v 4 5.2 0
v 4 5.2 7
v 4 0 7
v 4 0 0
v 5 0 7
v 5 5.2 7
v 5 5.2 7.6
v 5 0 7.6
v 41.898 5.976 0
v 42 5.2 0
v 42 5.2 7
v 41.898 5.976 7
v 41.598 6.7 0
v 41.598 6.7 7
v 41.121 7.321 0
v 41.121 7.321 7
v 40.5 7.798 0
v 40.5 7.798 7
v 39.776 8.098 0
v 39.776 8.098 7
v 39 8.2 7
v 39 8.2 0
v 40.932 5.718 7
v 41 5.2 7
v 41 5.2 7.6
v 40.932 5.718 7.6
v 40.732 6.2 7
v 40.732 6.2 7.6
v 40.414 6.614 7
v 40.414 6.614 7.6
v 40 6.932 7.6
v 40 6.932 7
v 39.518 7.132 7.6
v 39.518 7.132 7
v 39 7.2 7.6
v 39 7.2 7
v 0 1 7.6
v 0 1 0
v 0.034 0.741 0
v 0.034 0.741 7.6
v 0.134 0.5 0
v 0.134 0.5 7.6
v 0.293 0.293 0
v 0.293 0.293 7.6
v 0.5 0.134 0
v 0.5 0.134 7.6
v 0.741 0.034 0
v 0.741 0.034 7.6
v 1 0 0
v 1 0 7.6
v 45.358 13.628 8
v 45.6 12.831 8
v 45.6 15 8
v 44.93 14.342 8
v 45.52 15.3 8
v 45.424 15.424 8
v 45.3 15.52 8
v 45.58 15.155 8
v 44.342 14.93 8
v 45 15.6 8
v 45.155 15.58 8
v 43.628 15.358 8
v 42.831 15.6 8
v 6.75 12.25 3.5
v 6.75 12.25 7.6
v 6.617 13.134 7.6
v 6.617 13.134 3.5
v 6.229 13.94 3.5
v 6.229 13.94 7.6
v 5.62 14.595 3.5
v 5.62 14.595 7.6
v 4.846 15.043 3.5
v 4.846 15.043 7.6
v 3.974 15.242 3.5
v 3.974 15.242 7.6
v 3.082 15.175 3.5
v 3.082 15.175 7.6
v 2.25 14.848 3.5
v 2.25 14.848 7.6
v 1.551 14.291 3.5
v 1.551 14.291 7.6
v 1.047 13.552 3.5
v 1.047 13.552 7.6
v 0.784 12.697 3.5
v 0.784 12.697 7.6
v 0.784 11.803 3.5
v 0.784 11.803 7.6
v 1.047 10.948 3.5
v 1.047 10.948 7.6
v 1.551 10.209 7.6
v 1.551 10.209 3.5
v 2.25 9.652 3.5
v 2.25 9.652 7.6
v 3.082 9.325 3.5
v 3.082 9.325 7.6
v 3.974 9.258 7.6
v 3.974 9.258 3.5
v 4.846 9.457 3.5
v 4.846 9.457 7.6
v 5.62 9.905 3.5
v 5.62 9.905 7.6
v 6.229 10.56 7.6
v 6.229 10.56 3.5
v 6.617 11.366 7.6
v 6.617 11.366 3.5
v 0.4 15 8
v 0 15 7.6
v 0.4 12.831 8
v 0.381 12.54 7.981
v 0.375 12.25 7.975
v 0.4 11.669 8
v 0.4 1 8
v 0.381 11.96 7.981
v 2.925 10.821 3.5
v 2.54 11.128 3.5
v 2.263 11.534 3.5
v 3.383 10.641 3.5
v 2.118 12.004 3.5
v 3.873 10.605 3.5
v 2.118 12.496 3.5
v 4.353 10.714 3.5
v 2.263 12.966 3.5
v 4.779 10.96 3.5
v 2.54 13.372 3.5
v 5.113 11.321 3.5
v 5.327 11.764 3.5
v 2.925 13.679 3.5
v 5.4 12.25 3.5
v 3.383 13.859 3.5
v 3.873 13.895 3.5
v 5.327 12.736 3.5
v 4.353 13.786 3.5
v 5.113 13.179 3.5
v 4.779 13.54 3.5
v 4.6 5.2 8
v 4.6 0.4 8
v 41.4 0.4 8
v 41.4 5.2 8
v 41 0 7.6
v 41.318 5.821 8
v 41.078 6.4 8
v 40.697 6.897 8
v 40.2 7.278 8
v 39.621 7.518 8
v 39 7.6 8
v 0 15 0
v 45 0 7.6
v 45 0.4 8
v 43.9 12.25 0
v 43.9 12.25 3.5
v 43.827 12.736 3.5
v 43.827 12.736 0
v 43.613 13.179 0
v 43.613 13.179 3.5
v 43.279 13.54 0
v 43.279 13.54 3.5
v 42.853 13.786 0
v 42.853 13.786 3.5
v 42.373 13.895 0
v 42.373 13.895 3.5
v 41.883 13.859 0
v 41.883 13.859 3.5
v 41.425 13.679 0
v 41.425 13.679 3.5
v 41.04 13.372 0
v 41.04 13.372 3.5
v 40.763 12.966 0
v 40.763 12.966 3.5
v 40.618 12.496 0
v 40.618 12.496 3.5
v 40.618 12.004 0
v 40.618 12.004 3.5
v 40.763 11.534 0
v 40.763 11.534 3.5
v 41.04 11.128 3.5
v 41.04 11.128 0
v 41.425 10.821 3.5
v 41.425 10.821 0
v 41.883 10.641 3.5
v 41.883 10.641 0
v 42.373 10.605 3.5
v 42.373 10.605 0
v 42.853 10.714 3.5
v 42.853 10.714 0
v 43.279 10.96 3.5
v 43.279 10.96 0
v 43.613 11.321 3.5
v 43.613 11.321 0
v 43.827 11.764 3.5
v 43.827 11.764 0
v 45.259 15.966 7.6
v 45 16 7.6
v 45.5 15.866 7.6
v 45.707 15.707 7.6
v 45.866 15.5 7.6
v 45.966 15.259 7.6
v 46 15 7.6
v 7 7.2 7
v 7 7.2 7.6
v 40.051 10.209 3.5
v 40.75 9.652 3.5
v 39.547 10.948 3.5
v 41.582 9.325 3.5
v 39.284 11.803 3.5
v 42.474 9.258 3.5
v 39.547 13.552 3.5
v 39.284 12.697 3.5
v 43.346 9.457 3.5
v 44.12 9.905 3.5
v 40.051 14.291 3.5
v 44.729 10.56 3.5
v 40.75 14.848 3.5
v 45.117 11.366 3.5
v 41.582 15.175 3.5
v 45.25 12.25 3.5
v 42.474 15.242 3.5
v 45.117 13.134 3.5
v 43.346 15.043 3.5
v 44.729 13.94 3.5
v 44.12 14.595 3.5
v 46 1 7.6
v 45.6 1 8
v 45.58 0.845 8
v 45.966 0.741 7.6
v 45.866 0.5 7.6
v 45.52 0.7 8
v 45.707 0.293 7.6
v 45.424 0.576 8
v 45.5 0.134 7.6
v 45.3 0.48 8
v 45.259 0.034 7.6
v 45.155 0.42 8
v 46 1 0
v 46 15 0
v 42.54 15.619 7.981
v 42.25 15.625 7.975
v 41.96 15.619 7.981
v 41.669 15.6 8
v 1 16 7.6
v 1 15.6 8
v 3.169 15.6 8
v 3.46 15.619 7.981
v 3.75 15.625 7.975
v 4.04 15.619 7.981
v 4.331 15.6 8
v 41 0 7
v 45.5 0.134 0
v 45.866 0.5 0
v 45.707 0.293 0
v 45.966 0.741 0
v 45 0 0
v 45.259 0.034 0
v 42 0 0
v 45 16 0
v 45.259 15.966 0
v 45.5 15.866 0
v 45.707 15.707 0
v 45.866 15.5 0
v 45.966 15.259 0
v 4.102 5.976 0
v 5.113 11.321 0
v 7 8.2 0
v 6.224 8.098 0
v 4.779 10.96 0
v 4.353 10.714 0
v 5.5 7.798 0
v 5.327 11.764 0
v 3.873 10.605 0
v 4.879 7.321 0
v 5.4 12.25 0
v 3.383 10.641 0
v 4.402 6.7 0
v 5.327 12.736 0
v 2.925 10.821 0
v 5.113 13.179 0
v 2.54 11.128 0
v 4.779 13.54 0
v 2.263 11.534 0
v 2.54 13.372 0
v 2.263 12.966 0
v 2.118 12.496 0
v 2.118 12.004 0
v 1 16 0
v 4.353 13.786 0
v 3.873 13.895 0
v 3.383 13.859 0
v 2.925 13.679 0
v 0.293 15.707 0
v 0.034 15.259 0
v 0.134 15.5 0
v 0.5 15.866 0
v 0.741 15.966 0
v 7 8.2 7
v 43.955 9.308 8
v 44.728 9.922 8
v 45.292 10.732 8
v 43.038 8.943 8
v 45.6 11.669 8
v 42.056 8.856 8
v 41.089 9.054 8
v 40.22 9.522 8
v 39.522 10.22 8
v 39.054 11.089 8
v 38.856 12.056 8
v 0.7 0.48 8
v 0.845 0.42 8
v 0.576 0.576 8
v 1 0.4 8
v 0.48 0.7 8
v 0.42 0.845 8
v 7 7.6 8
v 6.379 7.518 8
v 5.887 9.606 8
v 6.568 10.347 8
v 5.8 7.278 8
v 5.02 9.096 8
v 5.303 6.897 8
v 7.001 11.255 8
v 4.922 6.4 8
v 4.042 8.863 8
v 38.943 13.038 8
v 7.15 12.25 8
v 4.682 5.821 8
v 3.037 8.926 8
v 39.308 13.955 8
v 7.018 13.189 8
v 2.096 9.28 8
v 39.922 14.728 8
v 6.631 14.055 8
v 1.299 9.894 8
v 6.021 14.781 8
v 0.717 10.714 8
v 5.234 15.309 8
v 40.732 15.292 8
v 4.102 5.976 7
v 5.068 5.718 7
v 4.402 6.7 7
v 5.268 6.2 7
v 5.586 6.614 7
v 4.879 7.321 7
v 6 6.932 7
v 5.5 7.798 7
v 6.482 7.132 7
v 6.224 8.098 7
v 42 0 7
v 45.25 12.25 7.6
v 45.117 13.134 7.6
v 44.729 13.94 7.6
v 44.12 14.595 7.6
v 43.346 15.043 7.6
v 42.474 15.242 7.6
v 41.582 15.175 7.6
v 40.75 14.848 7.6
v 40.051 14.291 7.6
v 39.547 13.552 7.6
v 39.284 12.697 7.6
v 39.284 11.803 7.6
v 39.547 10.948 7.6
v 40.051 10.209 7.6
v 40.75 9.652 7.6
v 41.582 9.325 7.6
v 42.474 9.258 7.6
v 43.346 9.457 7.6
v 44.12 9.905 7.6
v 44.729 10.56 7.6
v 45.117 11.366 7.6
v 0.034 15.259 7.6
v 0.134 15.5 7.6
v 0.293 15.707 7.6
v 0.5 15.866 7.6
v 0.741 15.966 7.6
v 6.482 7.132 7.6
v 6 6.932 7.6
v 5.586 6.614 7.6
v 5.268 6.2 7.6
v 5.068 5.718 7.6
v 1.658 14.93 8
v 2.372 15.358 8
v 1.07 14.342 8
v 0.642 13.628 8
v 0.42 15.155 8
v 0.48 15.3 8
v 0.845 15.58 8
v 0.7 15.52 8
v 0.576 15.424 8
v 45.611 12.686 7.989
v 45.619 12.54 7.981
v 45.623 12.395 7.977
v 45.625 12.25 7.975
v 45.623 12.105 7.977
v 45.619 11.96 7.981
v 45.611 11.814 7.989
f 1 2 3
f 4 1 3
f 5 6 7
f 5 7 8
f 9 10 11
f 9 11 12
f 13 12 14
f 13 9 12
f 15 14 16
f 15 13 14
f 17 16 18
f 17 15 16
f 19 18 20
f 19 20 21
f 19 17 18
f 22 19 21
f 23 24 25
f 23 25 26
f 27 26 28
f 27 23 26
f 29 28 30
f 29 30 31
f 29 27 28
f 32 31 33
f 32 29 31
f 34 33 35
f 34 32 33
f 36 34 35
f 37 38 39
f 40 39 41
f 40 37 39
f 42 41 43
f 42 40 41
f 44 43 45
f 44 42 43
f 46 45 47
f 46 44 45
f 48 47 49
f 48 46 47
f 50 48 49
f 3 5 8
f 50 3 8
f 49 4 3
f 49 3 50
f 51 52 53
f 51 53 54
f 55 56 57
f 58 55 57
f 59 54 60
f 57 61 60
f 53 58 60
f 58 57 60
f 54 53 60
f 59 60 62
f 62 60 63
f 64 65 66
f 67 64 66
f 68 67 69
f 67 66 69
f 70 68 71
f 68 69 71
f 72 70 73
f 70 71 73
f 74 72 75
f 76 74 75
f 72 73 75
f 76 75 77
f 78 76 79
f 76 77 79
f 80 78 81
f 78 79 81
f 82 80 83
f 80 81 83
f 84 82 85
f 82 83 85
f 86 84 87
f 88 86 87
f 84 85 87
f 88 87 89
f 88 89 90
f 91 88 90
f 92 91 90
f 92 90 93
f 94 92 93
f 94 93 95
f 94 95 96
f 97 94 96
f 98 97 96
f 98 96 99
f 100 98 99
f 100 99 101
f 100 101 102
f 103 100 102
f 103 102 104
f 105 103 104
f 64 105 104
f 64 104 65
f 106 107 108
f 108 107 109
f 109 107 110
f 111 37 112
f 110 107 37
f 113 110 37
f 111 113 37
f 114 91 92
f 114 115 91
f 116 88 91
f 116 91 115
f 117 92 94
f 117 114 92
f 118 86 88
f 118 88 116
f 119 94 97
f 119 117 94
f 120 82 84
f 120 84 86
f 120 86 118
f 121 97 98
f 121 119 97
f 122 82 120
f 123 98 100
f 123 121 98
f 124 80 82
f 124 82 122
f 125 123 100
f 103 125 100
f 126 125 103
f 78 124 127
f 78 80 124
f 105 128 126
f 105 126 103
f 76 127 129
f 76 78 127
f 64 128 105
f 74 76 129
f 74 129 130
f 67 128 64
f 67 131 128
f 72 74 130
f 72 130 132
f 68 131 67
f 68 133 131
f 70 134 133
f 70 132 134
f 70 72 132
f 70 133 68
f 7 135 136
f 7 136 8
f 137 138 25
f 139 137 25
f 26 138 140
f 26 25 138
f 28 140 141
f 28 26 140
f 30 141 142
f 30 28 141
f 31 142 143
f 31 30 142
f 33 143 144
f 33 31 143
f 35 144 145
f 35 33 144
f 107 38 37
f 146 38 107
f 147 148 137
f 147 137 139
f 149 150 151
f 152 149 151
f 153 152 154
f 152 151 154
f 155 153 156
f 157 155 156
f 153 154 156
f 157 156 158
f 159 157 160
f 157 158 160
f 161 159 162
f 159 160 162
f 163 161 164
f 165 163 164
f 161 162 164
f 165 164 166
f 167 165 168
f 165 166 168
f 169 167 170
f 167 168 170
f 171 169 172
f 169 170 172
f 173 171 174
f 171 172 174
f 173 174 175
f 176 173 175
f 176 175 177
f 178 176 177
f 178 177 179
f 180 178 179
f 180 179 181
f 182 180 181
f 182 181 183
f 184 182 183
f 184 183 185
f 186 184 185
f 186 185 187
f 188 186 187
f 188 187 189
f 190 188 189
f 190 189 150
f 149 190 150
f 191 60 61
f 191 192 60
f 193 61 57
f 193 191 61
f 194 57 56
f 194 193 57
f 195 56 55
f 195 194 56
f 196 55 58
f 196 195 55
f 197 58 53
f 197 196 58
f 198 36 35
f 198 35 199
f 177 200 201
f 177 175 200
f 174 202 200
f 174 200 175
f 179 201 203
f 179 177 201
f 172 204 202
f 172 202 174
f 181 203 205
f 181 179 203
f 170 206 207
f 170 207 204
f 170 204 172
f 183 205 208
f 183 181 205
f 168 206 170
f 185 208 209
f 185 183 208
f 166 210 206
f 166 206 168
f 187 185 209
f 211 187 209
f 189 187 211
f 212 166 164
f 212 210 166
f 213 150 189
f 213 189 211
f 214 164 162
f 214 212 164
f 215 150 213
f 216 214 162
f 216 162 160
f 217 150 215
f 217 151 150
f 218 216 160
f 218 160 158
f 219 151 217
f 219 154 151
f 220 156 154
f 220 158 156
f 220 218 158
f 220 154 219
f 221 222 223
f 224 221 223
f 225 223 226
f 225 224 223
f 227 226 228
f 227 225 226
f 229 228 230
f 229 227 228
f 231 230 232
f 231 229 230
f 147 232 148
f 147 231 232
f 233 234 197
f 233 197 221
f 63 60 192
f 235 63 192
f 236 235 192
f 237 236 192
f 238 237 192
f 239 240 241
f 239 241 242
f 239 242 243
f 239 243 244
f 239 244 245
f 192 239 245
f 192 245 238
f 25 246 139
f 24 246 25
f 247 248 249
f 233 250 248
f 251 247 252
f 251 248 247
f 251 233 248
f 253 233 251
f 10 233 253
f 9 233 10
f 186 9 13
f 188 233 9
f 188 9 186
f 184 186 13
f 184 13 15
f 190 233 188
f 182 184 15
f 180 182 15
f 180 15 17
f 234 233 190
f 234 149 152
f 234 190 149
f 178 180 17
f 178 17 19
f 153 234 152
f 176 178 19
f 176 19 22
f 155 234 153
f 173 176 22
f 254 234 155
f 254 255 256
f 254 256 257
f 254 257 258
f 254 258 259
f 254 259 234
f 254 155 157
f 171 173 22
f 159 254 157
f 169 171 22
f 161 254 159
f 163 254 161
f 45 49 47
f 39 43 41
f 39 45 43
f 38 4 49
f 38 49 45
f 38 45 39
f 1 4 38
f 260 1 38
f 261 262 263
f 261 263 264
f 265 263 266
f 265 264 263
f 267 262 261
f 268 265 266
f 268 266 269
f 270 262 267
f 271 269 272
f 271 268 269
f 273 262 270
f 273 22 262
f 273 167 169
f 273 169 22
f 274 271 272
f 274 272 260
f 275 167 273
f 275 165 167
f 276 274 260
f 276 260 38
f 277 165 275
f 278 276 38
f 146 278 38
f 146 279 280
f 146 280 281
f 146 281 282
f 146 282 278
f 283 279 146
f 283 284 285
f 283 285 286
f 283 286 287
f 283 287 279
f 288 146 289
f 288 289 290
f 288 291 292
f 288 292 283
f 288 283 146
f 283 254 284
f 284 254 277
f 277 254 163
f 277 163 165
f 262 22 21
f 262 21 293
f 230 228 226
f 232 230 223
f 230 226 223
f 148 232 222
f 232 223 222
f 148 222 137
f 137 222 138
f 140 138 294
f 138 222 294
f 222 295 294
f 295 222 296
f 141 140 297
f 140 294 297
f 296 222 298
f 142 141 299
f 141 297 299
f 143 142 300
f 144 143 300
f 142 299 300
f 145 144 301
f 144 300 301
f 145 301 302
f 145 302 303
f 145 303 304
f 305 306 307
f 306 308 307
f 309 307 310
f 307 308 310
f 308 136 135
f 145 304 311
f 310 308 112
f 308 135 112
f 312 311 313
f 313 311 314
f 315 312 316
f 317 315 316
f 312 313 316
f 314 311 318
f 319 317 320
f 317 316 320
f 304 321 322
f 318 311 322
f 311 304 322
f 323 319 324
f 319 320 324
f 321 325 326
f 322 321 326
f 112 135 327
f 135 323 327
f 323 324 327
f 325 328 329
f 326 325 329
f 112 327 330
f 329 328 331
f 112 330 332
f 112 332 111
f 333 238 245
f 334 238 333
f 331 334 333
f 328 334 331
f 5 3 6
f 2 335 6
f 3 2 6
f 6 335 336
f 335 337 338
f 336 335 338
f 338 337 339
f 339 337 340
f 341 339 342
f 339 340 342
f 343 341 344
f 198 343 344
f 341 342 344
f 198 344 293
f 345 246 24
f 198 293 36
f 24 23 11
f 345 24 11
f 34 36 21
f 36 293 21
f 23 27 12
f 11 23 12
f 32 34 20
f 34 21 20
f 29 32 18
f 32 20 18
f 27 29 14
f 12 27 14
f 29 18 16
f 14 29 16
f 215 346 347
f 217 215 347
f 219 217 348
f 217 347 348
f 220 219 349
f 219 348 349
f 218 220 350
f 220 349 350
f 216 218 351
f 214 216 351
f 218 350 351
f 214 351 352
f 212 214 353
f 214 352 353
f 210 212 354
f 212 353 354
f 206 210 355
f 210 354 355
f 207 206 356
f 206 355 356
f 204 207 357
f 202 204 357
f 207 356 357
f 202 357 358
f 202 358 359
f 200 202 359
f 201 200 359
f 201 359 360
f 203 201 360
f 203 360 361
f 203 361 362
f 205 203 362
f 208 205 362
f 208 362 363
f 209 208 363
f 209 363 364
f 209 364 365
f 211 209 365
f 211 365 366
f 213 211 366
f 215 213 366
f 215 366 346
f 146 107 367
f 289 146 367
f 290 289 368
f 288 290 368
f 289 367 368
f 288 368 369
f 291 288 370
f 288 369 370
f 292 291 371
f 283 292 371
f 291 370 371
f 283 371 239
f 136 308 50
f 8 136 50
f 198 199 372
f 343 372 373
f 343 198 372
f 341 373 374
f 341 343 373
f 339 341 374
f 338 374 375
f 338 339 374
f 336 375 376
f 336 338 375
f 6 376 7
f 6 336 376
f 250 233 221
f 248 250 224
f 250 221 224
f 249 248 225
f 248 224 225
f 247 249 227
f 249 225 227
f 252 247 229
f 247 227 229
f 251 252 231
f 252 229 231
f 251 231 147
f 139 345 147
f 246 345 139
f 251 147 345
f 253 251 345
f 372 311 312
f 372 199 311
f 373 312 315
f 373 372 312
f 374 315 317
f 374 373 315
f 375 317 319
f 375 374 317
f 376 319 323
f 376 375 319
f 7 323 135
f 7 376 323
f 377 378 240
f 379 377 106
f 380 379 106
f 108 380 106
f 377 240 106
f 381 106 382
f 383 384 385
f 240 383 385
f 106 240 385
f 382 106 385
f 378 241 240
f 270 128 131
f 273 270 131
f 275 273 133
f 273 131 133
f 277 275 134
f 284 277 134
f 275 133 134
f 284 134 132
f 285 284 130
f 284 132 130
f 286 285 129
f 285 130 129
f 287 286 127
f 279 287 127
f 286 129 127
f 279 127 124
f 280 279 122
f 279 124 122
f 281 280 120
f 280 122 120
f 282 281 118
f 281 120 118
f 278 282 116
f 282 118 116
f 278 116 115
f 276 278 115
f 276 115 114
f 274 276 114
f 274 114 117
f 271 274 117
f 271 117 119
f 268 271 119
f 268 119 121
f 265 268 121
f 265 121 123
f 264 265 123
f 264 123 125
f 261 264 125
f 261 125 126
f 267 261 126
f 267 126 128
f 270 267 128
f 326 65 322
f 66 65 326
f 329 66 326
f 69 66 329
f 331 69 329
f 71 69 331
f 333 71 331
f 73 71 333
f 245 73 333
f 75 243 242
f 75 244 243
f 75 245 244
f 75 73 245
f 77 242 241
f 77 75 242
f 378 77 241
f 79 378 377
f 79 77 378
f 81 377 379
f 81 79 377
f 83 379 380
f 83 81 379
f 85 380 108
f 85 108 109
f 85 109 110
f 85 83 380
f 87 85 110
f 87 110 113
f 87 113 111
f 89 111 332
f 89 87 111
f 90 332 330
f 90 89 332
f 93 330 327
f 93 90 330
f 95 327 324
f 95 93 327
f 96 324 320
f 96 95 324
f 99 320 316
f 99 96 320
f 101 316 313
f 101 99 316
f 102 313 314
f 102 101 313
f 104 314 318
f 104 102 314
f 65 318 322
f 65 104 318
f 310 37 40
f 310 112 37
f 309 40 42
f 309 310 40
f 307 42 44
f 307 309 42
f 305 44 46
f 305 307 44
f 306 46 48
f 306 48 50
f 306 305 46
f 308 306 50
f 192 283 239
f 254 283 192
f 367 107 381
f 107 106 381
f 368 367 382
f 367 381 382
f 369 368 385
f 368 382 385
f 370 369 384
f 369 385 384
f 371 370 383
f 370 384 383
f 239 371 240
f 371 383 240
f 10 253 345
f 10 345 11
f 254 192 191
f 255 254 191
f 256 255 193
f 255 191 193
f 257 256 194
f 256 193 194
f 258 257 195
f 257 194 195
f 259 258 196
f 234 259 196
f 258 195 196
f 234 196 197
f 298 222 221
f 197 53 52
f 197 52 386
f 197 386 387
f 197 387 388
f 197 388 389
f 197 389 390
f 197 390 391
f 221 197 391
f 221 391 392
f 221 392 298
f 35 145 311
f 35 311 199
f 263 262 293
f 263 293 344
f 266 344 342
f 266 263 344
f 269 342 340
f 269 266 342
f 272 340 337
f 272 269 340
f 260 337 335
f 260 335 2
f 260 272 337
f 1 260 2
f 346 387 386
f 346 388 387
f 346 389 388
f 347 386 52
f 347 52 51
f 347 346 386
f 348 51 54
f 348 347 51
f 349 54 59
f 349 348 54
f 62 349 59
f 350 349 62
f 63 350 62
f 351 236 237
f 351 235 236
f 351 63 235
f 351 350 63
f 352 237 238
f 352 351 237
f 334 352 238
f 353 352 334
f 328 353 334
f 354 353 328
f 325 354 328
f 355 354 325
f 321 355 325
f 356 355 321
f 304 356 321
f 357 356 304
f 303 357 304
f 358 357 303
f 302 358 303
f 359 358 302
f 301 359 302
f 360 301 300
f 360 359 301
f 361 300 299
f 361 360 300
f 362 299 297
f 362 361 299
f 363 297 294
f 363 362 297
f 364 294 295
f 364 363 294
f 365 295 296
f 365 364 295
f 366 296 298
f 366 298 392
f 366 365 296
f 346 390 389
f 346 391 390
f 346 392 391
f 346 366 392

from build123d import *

# Parameters (mm, degrees)
BOSS_EXTRUDE1_DEPTH = 8
CUT_EXTRUDE1_REACH  = 51.356
SKETCH2_R           = 1.65
SKETCH3_R           = 3
CUT_EXTRUDE2_DEPTH  = 4.5
CUT_EXTRUDE3_DEPTH  = 7
FILLET1_R           = 1
CHAMFER2_SIZE       = 0.4


with BuildPart() as part:
    # Sketch1 → Boss-Extrude1 (new body)
    with BuildSketch(Plane.XY):
        with BuildLine():
            Line((0, 0), (0, 16))
            Line((0, 16), (46, 16))
            Line((46, 16), (46, 0))
            Line((46, 0), (41, 0))
            Line((41, 0), (41, 5.2))
            ThreePointArc((41, 5.2), (40.414213562, 6.614213562), (39, 7.2))
            Line((39, 7.2), (7, 7.2))
            ThreePointArc((7, 7.2), (5.585786438, 6.614213562), (5, 5.2))
            Line((5, 5.2), (5, 0))
            Line((5, 0), (0, 0))
        make_face()
    extrude(amount=BOSS_EXTRUDE1_DEPTH)

    # Sketch2 → Cut-Extrude1 (cut, up to next)
    with BuildSketch(Plane.XY.offset(8), mode=Mode.PRIVATE) as cut_extrude1_sk1:
        with Locations((3.75, 12.25)):
            Circle(SKETCH2_R)
    cut_extrude1_tool1 = extrude(cut_extrude1_sk1.sketch, amount=-CUT_EXTRUDE1_REACH, mode=Mode.PRIVATE) & part.part
    # Sketch2 → Cut-Extrude1 (cut, up to next)
    with BuildSketch(Plane.XY.offset(8), mode=Mode.PRIVATE) as cut_extrude1_sk2:
        with Locations((42.25, 12.25)):
            Circle(SKETCH2_R)
    cut_extrude1_tool2 = extrude(cut_extrude1_sk2.sketch, amount=-CUT_EXTRUDE1_REACH, mode=Mode.PRIVATE) & part.part
    add(cut_extrude1_tool1.solids().sort_by_distance((3.75, 12.25, 8))[0], mode=Mode.SUBTRACT)
    add(cut_extrude1_tool2.solids().sort_by_distance((42.25, 12.25, 8))[0], mode=Mode.SUBTRACT)

    # Sketch3 → Cut-Extrude2 (cut)
    with BuildSketch(Plane.XY.offset(8)):
        with Locations((3.75, 12.25)):
            Circle(SKETCH3_R)
        with Locations((42.25, 12.25)):
            Circle(SKETCH3_R)
    extrude(amount=-CUT_EXTRUDE2_DEPTH, mode=Mode.SUBTRACT)

    # Sketch4 → Cut-Extrude3 (cut)
    with BuildSketch(Plane(origin=(0, 0, 0), x_dir=(-1, 0, 0), z_dir=(0, 0, -1))):
        with BuildLine():
            Line((-4, 0), (-5, 0))
            Line((-5, 0), (-5, 5.2))
            ThreePointArc((-5, 5.2), (-5.585786438, 6.614213562), (-7, 7.2))
            Line((-7, 7.2), (-39, 7.2))
            ThreePointArc((-39, 7.2), (-40.414213592, 6.614213592), (-41, 5.2))
            Line((-41, 5.2), (-41, 0))
            Line((-41, 0), (-42, 0))
            Line((-42, 0), (-42, 5.200000101))
            ThreePointArc((-42, 5.200000101), (-41.121320373, 7.321320373), (-39.000000101, 8.2))
            Line((-39.000000101, 8.2), (-7, 8.2))
            ThreePointArc((-7, 8.2), (-4.878679656, 7.321320344), (-4, 5.2))
            Line((-4, 5.2), (-4, 0))
        make_face()
    extrude(amount=-CUT_EXTRUDE3_DEPTH, mode=Mode.SUBTRACT)

    # Fillet1
    fillet1_edges = [part.edges().sort_by_distance(p)[0] for p in [
        (0, 0, 4),
        (0, 16, 4),
        (46, 16, 4),
        (46, 0, 4),
    ]]
    fillet(fillet1_edges, radius=FILLET1_R)

    # Chamfer2
    # the kernel refuses this chamfer: 0.4 mm, written as the material it takes off along each edge
    with BuildSketch(Plane(origin=(6.028673195, 0, 8), x_dir=(0, 0.9996219169112966, 0.027495876610587326), z_dir=(-1, 0, 0)), Plane(origin=(45, 0, 8), x_dir=(0, 0.9996219169112966, 0.027495876610587378), z_dir=(-1, 0, 0))) as chamfer2_piece_1:
        Polygon((CHAMFER2_SIZE * 0.999621916911, CHAMFER2_SIZE * 0.0274958766106), (-CHAMFER2_SIZE * 0.0274958766106, CHAMFER2_SIZE * 0.999621916911), (0, 0), align=None)
    extrude(amount=5.028673195, mode=Mode.SUBTRACT)
    with BuildSketch(Plane(origin=(46, 15, 8), x_dir=(-0.9996219169112966, 0, 0.027495876610587656), z_dir=(0, -1, 0))) as chamfer2_piece_2:
        Polygon((CHAMFER2_SIZE * 0.999621916911, CHAMFER2_SIZE * 0.0274958766106), (-CHAMFER2_SIZE * 0.0274958766106, CHAMFER2_SIZE * 0.999621916911), (0, 0), align=None)
    extrude(amount=14, mode=Mode.SUBTRACT)
    with BuildSketch(Plane(origin=(1, 1, 8), x_dir=(-1, 0, 0), z_dir=(0, 1, 0))) as chamfer2_piece_3:
        Polygon((1, -CHAMFER2_SIZE), (1 - CHAMFER2_SIZE, 0), (1, 0), align=None)
    revolve(axis=Axis((1, 1, 8), (0, 0, 1)), revolution_arc=90, mode=Mode.SUBTRACT)
    with BuildSketch(Plane(origin=(45, 1, 8), x_dir=(1, 0, 0), z_dir=(0, 1, 0))) as chamfer2_piece_4:
        Polygon((1 - CHAMFER2_SIZE, 0), (1, CHAMFER2_SIZE), (1, 0), align=None)
    revolve(axis=Axis((45, 1, 8), (0, 0, -1)), revolution_arc=90, mode=Mode.SUBTRACT)
    with BuildSketch(Plane(origin=(45, 15, 8), x_dir=(0, 1, 0), z_dir=(-1, 0, 0))) as chamfer2_piece_5:
        Polygon((1 - CHAMFER2_SIZE, 0), (1, CHAMFER2_SIZE), (1, 0), align=None)
    revolve(axis=Axis((45, 15, 8), (0, 0, -1)), revolution_arc=90, mode=Mode.SUBTRACT)
    with BuildSketch(Plane(origin=(1, 15, 8), x_dir=(-1, 0, 0), z_dir=(0, -1, 0))) as chamfer2_piece_6:
        Polygon((1, CHAMFER2_SIZE), (1 - CHAMFER2_SIZE, 0), (1, 0), align=None)
    revolve(axis=Axis((1, 15, 8), (0, 0, -1)), revolution_arc=90, mode=Mode.SUBTRACT)
    with BuildSketch(Plane(origin=(7, 5.2, 8), x_dir=(0, 1, 0), z_dir=(1, 0, 0))) as chamfer2_piece_7:
        Polygon((2 + CHAMFER2_SIZE, 0), (2, -CHAMFER2_SIZE), (2, 0), align=None)
    revolve(axis=Axis((7, 5.2, 8), (0, 0, 1)), revolution_arc=90, mode=Mode.SUBTRACT)
    with BuildSketch(Plane(origin=(39, 7.2, 8), x_dir=(0, 0.9996219169112966, 0.027495876610587302), z_dir=(-1, 0, 0))) as chamfer2_piece_8:
        Polygon((CHAMFER2_SIZE * 0.999621916911, CHAMFER2_SIZE * 0.0274958766106), (-CHAMFER2_SIZE * 0.0274958766106, CHAMFER2_SIZE * 0.999621916911), (0, 0), align=None)
    extrude(amount=32, mode=Mode.SUBTRACT)
    with BuildSketch(Plane(origin=(39, 5.2, 8), x_dir=(1, 0, 0), z_dir=(0, -1, 0))) as chamfer2_piece_9:
        Polygon((2 + CHAMFER2_SIZE, 0), (2, -CHAMFER2_SIZE), (2, 0), align=None)
    revolve(axis=Axis((39, 5.2, 8), (0, 0, 1)), revolution_arc=90, mode=Mode.SUBTRACT)
    with BuildSketch(Plane(origin=(41, -1.028673195, 8), x_dir=(0.9996219169112966, 1.3659117145536696e-15, 0.027495876610587656), z_dir=(0, 1, 0)), Plane(origin=(5, 5.2, 8), x_dir=(-0.9996219169112966, 0, 0.027495876610587243), z_dir=(0, -1, 0))) as chamfer2_piece_10:
        Polygon((CHAMFER2_SIZE * 0.999621916911, CHAMFER2_SIZE * 0.0274958766106), (-CHAMFER2_SIZE * 0.0274958766106, CHAMFER2_SIZE * 0.999621916911), (0, 0), align=None)
    extrude(amount=6.228673195, mode=Mode.SUBTRACT)
    with BuildSketch(Plane(origin=(3.75, 12.25, 8), x_dir=(1, 0, 0), z_dir=(0, -1, 0))) as chamfer2_piece_11:
        Polygon((3 + CHAMFER2_SIZE, 0), (3, -CHAMFER2_SIZE), (3, 0), align=None)
    revolve(axis=Axis((3.75, 12.25, 8), (0, 0, 1)), mode=Mode.SUBTRACT)
    with BuildSketch(Plane(origin=(42.25, 12.25, 8), x_dir=(1, 0, 0), z_dir=(0, -1, 0))) as chamfer2_piece_12:
        Polygon((3 + CHAMFER2_SIZE, 0), (3, -CHAMFER2_SIZE), (3, 0), align=None)
    revolve(axis=Axis((42.25, 12.25, 8), (0, 0, 1)), mode=Mode.SUBTRACT)
    with BuildSketch(Plane(origin=(0, 1, 8), x_dir=(-0.027495876610586258, 0, -0.9996219169112966), z_dir=(0, 1, 0))) as chamfer2_piece_13:
        Polygon((CHAMFER2_SIZE * 0.999621916911, -CHAMFER2_SIZE * 0.0274958766106), (-CHAMFER2_SIZE * 0.0274958766106, -CHAMFER2_SIZE * 0.999621916911), (0, 0), align=None)
    extrude(amount=14, mode=Mode.SUBTRACT)
    with BuildSketch(Plane(origin=(1, 16, 8), x_dir=(0, -0.9996219169112966, 0.027495876610587302), z_dir=(1, 0, 0))) as chamfer2_piece_14:
        Polygon((CHAMFER2_SIZE * 0.999621916911, CHAMFER2_SIZE * 0.0274958766106), (-CHAMFER2_SIZE * 0.0274958766106, CHAMFER2_SIZE * 0.999621916911), (0, 0), align=None)
    extrude(amount=44, mode=Mode.SUBTRACT)


solid = part.part
